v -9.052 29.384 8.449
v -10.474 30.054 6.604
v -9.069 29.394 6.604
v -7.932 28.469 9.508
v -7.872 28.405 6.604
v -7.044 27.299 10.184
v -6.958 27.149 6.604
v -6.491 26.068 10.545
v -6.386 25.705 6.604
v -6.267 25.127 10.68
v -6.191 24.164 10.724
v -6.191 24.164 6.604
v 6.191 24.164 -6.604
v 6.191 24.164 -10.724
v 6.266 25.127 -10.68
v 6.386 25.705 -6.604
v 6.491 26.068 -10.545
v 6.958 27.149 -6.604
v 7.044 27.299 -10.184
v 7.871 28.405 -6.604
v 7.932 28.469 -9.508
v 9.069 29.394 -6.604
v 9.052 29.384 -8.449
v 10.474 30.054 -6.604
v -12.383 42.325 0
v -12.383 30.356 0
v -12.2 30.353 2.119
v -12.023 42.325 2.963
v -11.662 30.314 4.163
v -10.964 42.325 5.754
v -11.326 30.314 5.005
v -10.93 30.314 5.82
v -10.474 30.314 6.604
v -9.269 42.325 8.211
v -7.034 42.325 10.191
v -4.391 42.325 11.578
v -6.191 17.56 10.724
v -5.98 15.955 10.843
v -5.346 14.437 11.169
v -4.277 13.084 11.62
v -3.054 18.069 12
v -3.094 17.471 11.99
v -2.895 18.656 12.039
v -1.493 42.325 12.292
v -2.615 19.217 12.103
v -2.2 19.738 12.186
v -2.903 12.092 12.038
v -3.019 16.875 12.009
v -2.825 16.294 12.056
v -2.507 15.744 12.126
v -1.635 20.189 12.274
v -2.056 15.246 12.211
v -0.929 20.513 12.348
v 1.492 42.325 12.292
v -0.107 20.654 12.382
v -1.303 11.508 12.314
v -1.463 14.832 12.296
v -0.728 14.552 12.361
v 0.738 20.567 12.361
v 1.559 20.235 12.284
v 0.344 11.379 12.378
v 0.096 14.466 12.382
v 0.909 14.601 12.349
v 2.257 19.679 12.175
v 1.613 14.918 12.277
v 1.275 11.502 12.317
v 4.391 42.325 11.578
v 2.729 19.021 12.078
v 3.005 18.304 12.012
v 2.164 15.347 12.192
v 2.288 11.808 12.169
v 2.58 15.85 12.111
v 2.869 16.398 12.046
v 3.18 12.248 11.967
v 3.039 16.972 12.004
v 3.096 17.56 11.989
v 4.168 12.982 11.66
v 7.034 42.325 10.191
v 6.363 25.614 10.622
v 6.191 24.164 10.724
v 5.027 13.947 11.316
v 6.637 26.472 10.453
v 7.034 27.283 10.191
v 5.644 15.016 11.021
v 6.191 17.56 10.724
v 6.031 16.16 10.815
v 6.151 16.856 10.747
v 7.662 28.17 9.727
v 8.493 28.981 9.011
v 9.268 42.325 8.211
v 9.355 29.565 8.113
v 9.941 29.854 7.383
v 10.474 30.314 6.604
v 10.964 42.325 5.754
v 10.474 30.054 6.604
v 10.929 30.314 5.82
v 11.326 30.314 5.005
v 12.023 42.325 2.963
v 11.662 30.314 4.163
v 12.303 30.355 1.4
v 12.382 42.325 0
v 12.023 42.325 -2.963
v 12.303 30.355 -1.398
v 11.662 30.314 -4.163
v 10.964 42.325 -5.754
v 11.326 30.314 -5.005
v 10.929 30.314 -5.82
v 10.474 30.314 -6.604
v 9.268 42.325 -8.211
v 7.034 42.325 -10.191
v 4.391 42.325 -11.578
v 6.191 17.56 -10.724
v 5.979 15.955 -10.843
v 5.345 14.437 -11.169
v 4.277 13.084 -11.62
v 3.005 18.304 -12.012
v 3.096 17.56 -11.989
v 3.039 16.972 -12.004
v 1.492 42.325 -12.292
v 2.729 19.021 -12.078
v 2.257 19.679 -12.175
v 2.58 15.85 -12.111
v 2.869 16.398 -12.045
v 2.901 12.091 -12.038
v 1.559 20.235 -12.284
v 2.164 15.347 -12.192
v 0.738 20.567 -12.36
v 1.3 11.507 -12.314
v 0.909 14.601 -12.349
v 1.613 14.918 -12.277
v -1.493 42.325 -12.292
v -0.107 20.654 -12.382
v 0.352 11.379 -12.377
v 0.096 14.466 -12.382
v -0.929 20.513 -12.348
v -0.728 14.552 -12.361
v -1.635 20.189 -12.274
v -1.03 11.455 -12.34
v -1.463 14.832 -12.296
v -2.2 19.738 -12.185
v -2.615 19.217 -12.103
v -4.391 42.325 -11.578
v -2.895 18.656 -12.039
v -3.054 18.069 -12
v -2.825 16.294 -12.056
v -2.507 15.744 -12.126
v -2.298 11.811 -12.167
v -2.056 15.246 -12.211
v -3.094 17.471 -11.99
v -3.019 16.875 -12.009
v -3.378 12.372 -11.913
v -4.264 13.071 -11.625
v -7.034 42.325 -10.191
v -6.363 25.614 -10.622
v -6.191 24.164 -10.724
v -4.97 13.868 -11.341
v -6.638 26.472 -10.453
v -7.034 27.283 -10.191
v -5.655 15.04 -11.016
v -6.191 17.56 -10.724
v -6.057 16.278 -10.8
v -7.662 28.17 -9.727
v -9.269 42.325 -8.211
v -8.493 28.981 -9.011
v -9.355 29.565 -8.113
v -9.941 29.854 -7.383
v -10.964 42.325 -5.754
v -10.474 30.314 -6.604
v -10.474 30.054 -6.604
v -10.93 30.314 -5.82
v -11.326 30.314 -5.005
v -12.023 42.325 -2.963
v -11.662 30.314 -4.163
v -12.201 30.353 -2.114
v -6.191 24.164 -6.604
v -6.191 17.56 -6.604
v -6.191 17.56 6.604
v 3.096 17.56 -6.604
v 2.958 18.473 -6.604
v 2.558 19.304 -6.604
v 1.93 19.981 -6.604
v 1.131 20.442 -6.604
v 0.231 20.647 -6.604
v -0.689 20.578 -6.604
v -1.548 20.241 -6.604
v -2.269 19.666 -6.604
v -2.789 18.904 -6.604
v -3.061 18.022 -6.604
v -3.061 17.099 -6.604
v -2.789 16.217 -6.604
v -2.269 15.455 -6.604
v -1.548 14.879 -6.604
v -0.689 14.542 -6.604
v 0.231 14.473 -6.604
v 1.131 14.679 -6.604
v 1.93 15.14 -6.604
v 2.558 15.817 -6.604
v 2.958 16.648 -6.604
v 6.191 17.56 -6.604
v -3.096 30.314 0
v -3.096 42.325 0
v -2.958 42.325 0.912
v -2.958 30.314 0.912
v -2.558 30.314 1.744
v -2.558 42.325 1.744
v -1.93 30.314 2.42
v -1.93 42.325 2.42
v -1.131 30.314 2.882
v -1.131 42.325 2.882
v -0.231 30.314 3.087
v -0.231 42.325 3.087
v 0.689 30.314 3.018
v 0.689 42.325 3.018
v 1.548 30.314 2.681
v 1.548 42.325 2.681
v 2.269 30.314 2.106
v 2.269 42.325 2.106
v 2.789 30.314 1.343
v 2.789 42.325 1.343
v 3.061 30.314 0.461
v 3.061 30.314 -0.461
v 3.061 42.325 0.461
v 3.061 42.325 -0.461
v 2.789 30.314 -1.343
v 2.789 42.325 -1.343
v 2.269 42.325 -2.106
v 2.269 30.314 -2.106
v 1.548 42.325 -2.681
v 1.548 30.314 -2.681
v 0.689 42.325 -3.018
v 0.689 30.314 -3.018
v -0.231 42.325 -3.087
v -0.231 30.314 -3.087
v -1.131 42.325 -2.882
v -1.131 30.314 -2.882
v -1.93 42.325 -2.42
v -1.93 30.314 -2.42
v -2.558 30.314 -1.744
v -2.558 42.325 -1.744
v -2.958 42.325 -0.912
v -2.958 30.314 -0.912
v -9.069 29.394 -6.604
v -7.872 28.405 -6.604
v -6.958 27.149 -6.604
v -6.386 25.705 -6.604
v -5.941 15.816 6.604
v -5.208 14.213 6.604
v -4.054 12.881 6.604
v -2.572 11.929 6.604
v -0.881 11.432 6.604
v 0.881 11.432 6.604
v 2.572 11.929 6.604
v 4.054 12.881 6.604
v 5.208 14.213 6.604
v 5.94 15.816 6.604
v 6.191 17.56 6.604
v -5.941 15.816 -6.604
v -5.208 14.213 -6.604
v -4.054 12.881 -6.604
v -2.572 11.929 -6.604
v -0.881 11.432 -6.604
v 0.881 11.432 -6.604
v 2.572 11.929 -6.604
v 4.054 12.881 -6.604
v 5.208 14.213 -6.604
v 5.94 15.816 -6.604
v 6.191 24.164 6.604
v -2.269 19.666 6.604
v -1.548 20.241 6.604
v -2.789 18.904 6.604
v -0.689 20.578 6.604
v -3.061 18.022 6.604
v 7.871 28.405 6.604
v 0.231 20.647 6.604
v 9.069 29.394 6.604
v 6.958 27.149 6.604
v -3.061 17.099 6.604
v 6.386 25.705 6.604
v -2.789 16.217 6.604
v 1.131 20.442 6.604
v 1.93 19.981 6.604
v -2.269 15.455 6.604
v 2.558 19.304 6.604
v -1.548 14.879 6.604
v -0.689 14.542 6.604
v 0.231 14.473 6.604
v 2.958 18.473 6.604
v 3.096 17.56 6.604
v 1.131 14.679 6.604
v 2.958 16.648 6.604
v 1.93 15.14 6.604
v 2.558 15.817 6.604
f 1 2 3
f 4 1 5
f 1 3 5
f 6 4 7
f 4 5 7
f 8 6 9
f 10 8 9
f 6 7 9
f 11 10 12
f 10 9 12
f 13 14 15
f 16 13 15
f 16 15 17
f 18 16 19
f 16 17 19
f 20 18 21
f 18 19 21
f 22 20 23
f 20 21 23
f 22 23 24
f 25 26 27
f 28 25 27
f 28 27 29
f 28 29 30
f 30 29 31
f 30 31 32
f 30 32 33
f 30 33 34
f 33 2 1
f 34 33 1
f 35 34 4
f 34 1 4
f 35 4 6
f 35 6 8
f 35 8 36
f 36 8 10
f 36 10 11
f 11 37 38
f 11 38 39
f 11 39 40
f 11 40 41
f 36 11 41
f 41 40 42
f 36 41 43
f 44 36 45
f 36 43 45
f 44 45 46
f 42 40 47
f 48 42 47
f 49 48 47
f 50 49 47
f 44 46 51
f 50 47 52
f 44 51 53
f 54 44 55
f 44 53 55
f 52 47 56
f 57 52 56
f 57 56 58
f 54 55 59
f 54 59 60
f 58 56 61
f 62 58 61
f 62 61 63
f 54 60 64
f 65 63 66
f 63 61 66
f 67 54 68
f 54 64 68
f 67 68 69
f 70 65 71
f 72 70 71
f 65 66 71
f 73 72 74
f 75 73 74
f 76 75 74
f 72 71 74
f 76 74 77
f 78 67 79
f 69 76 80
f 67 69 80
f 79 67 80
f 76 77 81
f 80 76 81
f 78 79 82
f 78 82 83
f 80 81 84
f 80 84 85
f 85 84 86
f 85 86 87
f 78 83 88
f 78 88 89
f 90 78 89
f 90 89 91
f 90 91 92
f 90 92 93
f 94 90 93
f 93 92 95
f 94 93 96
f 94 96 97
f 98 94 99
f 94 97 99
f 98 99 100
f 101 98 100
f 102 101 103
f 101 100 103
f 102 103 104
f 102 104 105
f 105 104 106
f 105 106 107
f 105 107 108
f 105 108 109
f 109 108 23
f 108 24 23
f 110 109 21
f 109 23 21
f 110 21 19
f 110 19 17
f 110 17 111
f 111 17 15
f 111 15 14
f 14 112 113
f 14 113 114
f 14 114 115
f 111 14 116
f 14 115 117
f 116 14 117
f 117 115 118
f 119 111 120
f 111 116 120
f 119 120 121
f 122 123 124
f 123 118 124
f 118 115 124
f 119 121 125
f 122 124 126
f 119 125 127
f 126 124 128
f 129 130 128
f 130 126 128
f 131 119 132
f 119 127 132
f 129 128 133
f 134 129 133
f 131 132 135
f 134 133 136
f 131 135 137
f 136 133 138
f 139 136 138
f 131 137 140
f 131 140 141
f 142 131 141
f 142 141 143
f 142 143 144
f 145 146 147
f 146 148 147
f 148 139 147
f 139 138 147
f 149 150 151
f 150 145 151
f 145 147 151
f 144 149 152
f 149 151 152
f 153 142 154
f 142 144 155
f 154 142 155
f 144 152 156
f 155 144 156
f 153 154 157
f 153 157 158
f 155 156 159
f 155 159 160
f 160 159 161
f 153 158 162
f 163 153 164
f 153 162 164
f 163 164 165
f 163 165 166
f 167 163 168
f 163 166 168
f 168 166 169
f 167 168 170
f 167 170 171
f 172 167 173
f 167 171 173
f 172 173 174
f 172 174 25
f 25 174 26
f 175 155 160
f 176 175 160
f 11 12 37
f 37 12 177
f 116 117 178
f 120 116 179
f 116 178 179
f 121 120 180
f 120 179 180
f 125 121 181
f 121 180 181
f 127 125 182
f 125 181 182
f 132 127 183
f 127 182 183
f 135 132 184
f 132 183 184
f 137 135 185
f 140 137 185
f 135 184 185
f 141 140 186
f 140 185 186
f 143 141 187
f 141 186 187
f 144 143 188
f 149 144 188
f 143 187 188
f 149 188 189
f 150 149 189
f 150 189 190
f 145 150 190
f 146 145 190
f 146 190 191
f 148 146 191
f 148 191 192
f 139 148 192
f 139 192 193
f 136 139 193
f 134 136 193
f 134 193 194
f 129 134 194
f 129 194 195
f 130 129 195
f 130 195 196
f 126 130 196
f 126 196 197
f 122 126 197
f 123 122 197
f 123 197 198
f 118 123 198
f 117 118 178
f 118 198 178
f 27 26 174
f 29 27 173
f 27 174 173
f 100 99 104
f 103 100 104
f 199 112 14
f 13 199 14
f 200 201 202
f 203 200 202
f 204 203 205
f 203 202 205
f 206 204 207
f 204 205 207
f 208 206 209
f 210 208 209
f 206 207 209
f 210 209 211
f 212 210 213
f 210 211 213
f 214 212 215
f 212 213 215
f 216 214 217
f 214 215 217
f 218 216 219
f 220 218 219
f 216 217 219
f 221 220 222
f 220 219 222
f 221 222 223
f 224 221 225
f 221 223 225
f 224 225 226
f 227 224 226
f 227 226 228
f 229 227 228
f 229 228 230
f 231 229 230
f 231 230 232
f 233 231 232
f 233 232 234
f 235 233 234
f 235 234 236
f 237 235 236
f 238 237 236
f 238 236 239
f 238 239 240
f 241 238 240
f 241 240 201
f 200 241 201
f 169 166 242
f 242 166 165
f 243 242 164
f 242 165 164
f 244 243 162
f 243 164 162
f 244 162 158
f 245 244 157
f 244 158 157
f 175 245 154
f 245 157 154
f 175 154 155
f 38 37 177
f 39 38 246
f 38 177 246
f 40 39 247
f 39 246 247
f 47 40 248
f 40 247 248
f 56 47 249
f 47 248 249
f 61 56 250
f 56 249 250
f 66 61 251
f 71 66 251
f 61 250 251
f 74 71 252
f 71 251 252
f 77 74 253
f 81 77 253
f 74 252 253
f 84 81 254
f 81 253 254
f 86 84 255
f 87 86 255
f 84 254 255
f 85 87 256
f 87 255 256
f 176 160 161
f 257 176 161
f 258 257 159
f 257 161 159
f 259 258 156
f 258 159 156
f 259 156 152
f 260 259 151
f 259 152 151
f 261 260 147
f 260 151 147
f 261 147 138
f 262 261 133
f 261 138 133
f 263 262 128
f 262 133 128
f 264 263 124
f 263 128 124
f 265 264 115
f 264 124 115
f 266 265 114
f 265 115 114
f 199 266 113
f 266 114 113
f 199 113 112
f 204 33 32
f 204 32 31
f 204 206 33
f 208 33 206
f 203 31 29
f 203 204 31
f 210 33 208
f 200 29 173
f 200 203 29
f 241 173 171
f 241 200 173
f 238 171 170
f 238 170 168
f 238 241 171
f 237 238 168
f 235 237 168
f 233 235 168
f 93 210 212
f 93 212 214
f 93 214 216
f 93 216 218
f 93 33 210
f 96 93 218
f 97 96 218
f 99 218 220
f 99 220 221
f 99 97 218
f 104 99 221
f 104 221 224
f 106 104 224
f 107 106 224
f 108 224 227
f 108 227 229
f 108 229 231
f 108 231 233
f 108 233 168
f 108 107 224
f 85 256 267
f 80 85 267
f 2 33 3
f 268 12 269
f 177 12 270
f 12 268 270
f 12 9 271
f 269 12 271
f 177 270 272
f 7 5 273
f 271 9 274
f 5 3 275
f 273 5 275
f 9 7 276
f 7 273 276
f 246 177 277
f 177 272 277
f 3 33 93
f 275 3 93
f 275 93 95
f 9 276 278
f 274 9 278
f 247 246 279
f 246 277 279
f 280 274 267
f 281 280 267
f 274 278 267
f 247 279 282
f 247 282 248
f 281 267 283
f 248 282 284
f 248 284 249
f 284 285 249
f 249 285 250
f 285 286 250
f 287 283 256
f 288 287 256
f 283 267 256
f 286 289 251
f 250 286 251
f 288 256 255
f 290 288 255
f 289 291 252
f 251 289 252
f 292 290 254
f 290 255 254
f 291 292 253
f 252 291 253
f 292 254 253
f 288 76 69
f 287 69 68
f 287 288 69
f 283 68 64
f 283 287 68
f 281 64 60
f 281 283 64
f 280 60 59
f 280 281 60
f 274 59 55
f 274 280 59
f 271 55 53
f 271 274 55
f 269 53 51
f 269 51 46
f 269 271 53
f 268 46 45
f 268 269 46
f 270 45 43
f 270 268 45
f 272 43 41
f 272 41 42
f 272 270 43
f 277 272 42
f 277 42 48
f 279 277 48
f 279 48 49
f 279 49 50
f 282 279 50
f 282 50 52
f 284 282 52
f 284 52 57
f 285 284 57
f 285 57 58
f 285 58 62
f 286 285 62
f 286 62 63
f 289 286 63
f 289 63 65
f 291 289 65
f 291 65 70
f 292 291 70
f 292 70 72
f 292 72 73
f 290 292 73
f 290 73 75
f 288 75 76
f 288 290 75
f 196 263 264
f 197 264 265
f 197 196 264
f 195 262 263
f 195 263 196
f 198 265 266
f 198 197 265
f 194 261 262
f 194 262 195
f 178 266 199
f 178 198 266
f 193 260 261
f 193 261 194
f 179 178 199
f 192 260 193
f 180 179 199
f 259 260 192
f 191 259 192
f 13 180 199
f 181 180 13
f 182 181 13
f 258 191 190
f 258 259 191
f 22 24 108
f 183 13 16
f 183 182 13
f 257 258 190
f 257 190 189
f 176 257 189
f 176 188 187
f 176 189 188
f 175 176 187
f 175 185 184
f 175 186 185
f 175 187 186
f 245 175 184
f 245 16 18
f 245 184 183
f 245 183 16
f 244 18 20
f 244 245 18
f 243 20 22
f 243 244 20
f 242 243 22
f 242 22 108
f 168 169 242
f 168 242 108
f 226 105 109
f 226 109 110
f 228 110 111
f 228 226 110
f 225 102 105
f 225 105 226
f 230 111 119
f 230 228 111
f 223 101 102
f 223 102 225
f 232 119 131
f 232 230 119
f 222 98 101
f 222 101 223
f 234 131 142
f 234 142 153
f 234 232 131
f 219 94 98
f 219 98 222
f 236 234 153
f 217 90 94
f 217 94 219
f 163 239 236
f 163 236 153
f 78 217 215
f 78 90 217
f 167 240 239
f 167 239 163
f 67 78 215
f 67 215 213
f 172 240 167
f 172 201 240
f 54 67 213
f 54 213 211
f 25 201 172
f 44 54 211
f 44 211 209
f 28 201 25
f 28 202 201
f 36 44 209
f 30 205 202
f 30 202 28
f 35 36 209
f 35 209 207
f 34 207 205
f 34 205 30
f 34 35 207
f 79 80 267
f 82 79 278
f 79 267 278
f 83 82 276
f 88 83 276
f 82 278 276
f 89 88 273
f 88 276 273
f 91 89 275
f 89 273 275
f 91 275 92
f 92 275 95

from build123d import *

# Parameters (mm, degrees)
SKETCH1_R               = 19.05
BASE_EXTRUDE_DEPTH      = 47.625
CUT_EXTRUDE1_DEPTH      = 20.05
CUT_EXTRUDE1_DEPTH_BACK = 20.05
CUT_EXTRUDE5_DEPTH      = 20.0500001
CUT_EXTRUDE5_DEPTH_BACK = 20.0500001
SKETCH11_R              = 4.7625
CUT_EXTRUDE6_DEPTH      = 20.0500001
CUT_EXTRUDE6_DEPTH_BACK = 20.0500001
SKETCH12_R              = 4.7625
CUT_EXTRUDE7_DEPTH      = 48.625000104
SCALE1_SCALE            = 0.65


with BuildPart() as part:
    # Sketch1 → Base-Extrude (new body)
    with BuildSketch(Plane(origin=(0, 0, 0), x_dir=(-1, 0, 0), z_dir=(0, 1, 0))):
        Circle(SKETCH1_R)
    extrude(amount=BASE_EXTRUDE_DEPTH)

    # Sketch2 → Cut-Extrude1 (cut, two sides)
    with BuildSketch(Plane.XY) as cut_extrude1_sk:
        with BuildLine():
            Line((-19.05, -131.979516723), (-19.05, 0))
            Line((-19.05, 0), (-19.05, 29.21))
            ThreePointArc((-19.05, 29.21), (-12.314807909, 26.420192091), (-9.525, 19.685))
            Line((-9.525, 19.685), (-9.525, 9.525))
            ThreePointArc((-9.525, 9.525), (0, 0), (9.525, 9.525))
            Line((9.525, 9.525), (9.525, 19.685))
            ThreePointArc((9.525, 19.685), (12.314807909, 26.420192091), (19.05, 29.21))
            Line((19.05, 29.21), (19.05, 0))
            Line((19.05, 0), (19.05, -131.979516723))
            Line((19.05, -131.979516723), (19.05, -395.938550169))
            Line((19.05, -395.938550169), (-19.05, -395.938550169))
            Line((-19.05, -395.938550169), (-19.05, -131.979516723))
        make_face()
    extrude(amount=CUT_EXTRUDE1_DEPTH, mode=Mode.SUBTRACT)
    extrude(cut_extrude1_sk.sketch, amount=-CUT_EXTRUDE1_DEPTH_BACK, mode=Mode.SUBTRACT)

    # Sketch8 → Cut-Extrude5 (cut, two sides)
    with BuildSketch(Plane(origin=(0, 0, 0), x_dir=(0, 0, -1), z_dir=(1, 0, 0))) as cut_extrude5_sk:
        Polygon((-10.16, -121.738350451), (-10.16, 0), (-10.16, 29.145238826), (10.16, 29.145238826), (10.16, 0), (10.16, -121.738350451), (10.16, -365.215051352), (-10.16, -365.215051352), align=None)
    extrude(amount=CUT_EXTRUDE5_DEPTH, mode=Mode.SUBTRACT)
    extrude(cut_extrude5_sk.sketch, amount=-CUT_EXTRUDE5_DEPTH_BACK, mode=Mode.SUBTRACT)

    # Sketch11 → Cut-Extrude6 (cut, two sides)
    with BuildSketch(Plane.XY) as cut_extrude6_sk:
        with Locations((0, 9.525)):
            Circle(SKETCH11_R)
    extrude(amount=CUT_EXTRUDE6_DEPTH, mode=Mode.SUBTRACT)
    extrude(cut_extrude6_sk.sketch, amount=-CUT_EXTRUDE6_DEPTH_BACK, mode=Mode.SUBTRACT)

    # Sketch12 → Cut-Extrude7 (cut, through all)
    with BuildSketch(Plane(origin=(0, 47.625, 0), x_dir=(-1, 0, 0), z_dir=(0, 1, 0))):
        Circle(SKETCH12_R)
    extrude(amount=-CUT_EXTRUDE7_DEPTH, mode=Mode.SUBTRACT)


with BuildPart() as part_1:
    # Scale1: scaled about (-0.00021981, 32.483233493, 0.000100002)
    add(part.part.scale(SCALE1_SCALE).moved(Location((-7.6933e-05, 11.369131723, 3.5001e-05))))


solid = part_1.part
